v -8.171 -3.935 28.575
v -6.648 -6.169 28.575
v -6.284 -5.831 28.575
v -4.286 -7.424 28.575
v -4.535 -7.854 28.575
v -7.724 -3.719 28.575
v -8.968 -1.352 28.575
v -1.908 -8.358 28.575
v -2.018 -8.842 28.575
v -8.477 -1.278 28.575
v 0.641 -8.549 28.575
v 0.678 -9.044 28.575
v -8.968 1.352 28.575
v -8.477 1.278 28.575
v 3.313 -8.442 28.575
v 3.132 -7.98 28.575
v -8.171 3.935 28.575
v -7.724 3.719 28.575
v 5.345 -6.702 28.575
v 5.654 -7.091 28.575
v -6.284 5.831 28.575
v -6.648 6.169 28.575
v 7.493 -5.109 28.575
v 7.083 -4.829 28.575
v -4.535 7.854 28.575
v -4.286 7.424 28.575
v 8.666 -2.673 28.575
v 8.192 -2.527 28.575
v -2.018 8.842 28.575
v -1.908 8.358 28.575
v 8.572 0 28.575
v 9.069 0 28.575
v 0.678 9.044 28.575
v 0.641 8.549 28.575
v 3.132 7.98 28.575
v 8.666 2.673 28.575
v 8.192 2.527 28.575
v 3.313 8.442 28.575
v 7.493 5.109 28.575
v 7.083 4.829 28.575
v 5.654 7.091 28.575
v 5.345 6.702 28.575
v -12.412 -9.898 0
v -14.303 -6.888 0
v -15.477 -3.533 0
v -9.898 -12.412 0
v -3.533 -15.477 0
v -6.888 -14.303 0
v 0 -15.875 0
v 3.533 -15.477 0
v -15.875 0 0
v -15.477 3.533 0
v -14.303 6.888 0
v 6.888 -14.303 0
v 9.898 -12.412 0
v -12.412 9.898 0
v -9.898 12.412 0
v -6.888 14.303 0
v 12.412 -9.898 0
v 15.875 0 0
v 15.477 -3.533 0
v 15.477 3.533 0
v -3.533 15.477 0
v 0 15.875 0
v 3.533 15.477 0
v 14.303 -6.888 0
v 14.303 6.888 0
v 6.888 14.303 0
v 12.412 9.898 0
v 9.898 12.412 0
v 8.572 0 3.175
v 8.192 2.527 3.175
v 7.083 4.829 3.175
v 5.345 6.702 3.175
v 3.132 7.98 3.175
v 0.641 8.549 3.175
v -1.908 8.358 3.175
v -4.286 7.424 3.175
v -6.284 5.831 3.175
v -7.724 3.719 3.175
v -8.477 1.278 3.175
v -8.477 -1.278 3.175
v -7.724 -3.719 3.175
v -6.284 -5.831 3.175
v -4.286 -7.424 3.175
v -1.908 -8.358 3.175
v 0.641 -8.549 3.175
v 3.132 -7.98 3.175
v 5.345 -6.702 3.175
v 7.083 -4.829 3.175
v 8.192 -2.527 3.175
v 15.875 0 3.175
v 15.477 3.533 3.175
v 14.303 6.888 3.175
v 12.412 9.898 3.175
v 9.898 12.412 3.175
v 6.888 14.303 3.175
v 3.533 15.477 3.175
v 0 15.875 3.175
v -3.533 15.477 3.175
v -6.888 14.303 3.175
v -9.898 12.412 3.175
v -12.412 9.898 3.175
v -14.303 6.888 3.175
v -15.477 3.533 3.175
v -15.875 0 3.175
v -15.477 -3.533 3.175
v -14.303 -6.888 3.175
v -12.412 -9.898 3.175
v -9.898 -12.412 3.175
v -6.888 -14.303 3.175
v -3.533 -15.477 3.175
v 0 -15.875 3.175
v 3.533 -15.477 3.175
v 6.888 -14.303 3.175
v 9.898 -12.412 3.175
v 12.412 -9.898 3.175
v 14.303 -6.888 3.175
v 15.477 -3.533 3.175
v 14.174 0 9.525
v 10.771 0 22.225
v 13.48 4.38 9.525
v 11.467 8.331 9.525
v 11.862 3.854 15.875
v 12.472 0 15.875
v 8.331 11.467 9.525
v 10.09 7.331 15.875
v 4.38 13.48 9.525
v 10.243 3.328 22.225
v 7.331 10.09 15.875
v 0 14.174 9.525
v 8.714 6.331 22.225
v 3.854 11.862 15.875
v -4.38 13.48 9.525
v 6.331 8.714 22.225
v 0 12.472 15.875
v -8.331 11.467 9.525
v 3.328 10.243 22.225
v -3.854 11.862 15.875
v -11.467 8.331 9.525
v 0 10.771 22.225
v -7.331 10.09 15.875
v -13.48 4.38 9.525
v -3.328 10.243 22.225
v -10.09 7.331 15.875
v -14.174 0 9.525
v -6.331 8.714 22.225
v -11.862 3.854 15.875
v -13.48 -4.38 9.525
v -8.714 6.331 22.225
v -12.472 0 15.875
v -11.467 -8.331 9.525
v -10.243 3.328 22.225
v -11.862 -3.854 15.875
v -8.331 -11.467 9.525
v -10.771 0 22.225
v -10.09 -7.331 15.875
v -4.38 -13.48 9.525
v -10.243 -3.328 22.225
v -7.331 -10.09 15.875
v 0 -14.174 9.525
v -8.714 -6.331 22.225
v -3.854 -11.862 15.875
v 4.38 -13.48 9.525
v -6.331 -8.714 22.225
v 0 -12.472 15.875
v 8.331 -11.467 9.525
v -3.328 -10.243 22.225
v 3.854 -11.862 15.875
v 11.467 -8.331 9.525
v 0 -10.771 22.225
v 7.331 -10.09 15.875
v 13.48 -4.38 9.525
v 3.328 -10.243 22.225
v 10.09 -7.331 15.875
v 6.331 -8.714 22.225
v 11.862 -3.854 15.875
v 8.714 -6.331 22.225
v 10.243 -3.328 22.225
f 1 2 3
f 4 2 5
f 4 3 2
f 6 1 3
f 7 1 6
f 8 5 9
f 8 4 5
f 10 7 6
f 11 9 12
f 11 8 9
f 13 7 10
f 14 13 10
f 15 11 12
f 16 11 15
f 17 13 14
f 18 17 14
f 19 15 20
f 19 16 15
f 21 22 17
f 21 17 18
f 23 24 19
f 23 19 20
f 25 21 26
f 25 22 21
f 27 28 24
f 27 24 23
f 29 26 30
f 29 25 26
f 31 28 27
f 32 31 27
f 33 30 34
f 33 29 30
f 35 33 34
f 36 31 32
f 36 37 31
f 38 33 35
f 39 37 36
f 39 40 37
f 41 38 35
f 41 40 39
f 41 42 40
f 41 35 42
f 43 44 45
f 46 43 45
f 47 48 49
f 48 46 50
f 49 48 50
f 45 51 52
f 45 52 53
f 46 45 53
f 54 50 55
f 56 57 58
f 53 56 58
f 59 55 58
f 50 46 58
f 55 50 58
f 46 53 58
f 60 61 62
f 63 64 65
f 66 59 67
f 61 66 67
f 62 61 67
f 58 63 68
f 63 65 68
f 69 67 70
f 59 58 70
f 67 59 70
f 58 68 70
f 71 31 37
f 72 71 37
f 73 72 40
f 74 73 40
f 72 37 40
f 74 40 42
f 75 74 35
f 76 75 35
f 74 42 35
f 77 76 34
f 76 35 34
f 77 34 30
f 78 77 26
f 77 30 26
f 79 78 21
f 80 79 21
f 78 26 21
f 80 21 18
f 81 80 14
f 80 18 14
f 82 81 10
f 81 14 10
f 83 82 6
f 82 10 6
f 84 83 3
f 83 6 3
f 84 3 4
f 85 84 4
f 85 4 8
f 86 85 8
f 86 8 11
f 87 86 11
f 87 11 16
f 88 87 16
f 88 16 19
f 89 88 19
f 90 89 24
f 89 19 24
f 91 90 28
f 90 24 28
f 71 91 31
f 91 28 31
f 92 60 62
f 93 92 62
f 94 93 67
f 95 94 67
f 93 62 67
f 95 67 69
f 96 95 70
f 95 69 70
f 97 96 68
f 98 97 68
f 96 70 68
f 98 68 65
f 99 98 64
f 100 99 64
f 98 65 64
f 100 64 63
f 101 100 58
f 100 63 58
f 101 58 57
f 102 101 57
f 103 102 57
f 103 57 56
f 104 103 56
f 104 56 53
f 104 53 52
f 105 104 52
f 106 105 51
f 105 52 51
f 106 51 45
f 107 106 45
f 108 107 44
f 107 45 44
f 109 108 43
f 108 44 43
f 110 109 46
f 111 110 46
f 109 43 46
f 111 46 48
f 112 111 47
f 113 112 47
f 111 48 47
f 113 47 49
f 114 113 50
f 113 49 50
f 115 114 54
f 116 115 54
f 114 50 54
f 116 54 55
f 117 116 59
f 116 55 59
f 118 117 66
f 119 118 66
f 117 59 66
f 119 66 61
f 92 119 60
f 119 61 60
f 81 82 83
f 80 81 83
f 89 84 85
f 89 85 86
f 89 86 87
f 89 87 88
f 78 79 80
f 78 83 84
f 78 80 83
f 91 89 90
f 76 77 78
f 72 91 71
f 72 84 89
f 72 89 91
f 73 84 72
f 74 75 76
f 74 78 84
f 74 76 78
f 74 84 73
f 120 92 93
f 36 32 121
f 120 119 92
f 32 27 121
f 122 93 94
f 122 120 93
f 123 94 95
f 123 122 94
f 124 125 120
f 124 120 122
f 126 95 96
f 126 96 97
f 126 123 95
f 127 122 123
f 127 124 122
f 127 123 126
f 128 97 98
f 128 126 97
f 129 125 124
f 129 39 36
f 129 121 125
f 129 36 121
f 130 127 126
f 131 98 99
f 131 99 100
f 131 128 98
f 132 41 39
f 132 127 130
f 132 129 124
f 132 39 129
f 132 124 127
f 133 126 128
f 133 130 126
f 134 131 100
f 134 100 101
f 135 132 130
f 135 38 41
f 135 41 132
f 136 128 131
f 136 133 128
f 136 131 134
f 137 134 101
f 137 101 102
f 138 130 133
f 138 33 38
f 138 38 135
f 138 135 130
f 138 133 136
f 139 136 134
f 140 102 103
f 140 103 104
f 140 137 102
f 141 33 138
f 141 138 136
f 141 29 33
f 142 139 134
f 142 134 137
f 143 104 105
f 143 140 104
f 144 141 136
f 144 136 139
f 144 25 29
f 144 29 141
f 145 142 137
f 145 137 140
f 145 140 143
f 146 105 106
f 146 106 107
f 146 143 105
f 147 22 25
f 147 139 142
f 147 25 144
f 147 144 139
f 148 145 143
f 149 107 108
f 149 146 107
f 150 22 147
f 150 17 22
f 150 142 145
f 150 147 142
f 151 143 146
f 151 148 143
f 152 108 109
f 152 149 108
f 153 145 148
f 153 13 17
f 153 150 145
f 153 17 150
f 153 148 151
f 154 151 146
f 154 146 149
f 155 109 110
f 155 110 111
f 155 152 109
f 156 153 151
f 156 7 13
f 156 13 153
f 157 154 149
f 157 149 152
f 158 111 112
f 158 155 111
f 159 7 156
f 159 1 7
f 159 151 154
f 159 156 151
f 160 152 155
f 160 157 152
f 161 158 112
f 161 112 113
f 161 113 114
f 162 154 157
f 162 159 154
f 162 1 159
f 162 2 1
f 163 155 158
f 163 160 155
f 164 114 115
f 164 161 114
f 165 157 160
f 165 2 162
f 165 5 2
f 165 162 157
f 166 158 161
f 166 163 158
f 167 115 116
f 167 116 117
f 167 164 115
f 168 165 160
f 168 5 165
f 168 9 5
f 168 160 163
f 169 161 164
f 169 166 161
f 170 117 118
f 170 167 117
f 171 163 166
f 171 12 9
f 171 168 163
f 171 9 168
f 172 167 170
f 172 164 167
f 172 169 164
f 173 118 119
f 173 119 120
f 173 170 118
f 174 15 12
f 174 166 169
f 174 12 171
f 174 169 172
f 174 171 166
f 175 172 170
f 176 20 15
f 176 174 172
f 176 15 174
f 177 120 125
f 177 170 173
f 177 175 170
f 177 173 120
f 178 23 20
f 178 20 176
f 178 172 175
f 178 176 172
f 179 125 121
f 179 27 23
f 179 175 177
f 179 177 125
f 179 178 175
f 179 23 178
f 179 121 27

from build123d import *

# Parameters (mm, degrees)
F0_R      = 15.875
F1_DEPTH  = 3.175
F1_FACE_R = 15.875
F2_DEPTH  = 25.4
F2_TAPER  = 15
F3_R      = 8.5725
F4_DEPTH  = 25.4


with BuildPart() as f1:
    # F0 (on Top) → F1 (new body)
    with BuildSketch(Plane.XY):
        Circle(F0_R)
    extrude(amount=F1_DEPTH)

    # F1_face (on face) → F2 (join)
    with BuildSketch(Plane.XY.offset(3.175)):
        Circle(F1_FACE_R)
    extrude(amount=F2_DEPTH, taper=F2_TAPER)

    # F3 (on face) → F4 (cut)
    with BuildSketch(Plane.XY.offset(28.575)):
        Circle(F3_R)
    extrude(amount=-F4_DEPTH, mode=Mode.SUBTRACT)


solid = f1.part
